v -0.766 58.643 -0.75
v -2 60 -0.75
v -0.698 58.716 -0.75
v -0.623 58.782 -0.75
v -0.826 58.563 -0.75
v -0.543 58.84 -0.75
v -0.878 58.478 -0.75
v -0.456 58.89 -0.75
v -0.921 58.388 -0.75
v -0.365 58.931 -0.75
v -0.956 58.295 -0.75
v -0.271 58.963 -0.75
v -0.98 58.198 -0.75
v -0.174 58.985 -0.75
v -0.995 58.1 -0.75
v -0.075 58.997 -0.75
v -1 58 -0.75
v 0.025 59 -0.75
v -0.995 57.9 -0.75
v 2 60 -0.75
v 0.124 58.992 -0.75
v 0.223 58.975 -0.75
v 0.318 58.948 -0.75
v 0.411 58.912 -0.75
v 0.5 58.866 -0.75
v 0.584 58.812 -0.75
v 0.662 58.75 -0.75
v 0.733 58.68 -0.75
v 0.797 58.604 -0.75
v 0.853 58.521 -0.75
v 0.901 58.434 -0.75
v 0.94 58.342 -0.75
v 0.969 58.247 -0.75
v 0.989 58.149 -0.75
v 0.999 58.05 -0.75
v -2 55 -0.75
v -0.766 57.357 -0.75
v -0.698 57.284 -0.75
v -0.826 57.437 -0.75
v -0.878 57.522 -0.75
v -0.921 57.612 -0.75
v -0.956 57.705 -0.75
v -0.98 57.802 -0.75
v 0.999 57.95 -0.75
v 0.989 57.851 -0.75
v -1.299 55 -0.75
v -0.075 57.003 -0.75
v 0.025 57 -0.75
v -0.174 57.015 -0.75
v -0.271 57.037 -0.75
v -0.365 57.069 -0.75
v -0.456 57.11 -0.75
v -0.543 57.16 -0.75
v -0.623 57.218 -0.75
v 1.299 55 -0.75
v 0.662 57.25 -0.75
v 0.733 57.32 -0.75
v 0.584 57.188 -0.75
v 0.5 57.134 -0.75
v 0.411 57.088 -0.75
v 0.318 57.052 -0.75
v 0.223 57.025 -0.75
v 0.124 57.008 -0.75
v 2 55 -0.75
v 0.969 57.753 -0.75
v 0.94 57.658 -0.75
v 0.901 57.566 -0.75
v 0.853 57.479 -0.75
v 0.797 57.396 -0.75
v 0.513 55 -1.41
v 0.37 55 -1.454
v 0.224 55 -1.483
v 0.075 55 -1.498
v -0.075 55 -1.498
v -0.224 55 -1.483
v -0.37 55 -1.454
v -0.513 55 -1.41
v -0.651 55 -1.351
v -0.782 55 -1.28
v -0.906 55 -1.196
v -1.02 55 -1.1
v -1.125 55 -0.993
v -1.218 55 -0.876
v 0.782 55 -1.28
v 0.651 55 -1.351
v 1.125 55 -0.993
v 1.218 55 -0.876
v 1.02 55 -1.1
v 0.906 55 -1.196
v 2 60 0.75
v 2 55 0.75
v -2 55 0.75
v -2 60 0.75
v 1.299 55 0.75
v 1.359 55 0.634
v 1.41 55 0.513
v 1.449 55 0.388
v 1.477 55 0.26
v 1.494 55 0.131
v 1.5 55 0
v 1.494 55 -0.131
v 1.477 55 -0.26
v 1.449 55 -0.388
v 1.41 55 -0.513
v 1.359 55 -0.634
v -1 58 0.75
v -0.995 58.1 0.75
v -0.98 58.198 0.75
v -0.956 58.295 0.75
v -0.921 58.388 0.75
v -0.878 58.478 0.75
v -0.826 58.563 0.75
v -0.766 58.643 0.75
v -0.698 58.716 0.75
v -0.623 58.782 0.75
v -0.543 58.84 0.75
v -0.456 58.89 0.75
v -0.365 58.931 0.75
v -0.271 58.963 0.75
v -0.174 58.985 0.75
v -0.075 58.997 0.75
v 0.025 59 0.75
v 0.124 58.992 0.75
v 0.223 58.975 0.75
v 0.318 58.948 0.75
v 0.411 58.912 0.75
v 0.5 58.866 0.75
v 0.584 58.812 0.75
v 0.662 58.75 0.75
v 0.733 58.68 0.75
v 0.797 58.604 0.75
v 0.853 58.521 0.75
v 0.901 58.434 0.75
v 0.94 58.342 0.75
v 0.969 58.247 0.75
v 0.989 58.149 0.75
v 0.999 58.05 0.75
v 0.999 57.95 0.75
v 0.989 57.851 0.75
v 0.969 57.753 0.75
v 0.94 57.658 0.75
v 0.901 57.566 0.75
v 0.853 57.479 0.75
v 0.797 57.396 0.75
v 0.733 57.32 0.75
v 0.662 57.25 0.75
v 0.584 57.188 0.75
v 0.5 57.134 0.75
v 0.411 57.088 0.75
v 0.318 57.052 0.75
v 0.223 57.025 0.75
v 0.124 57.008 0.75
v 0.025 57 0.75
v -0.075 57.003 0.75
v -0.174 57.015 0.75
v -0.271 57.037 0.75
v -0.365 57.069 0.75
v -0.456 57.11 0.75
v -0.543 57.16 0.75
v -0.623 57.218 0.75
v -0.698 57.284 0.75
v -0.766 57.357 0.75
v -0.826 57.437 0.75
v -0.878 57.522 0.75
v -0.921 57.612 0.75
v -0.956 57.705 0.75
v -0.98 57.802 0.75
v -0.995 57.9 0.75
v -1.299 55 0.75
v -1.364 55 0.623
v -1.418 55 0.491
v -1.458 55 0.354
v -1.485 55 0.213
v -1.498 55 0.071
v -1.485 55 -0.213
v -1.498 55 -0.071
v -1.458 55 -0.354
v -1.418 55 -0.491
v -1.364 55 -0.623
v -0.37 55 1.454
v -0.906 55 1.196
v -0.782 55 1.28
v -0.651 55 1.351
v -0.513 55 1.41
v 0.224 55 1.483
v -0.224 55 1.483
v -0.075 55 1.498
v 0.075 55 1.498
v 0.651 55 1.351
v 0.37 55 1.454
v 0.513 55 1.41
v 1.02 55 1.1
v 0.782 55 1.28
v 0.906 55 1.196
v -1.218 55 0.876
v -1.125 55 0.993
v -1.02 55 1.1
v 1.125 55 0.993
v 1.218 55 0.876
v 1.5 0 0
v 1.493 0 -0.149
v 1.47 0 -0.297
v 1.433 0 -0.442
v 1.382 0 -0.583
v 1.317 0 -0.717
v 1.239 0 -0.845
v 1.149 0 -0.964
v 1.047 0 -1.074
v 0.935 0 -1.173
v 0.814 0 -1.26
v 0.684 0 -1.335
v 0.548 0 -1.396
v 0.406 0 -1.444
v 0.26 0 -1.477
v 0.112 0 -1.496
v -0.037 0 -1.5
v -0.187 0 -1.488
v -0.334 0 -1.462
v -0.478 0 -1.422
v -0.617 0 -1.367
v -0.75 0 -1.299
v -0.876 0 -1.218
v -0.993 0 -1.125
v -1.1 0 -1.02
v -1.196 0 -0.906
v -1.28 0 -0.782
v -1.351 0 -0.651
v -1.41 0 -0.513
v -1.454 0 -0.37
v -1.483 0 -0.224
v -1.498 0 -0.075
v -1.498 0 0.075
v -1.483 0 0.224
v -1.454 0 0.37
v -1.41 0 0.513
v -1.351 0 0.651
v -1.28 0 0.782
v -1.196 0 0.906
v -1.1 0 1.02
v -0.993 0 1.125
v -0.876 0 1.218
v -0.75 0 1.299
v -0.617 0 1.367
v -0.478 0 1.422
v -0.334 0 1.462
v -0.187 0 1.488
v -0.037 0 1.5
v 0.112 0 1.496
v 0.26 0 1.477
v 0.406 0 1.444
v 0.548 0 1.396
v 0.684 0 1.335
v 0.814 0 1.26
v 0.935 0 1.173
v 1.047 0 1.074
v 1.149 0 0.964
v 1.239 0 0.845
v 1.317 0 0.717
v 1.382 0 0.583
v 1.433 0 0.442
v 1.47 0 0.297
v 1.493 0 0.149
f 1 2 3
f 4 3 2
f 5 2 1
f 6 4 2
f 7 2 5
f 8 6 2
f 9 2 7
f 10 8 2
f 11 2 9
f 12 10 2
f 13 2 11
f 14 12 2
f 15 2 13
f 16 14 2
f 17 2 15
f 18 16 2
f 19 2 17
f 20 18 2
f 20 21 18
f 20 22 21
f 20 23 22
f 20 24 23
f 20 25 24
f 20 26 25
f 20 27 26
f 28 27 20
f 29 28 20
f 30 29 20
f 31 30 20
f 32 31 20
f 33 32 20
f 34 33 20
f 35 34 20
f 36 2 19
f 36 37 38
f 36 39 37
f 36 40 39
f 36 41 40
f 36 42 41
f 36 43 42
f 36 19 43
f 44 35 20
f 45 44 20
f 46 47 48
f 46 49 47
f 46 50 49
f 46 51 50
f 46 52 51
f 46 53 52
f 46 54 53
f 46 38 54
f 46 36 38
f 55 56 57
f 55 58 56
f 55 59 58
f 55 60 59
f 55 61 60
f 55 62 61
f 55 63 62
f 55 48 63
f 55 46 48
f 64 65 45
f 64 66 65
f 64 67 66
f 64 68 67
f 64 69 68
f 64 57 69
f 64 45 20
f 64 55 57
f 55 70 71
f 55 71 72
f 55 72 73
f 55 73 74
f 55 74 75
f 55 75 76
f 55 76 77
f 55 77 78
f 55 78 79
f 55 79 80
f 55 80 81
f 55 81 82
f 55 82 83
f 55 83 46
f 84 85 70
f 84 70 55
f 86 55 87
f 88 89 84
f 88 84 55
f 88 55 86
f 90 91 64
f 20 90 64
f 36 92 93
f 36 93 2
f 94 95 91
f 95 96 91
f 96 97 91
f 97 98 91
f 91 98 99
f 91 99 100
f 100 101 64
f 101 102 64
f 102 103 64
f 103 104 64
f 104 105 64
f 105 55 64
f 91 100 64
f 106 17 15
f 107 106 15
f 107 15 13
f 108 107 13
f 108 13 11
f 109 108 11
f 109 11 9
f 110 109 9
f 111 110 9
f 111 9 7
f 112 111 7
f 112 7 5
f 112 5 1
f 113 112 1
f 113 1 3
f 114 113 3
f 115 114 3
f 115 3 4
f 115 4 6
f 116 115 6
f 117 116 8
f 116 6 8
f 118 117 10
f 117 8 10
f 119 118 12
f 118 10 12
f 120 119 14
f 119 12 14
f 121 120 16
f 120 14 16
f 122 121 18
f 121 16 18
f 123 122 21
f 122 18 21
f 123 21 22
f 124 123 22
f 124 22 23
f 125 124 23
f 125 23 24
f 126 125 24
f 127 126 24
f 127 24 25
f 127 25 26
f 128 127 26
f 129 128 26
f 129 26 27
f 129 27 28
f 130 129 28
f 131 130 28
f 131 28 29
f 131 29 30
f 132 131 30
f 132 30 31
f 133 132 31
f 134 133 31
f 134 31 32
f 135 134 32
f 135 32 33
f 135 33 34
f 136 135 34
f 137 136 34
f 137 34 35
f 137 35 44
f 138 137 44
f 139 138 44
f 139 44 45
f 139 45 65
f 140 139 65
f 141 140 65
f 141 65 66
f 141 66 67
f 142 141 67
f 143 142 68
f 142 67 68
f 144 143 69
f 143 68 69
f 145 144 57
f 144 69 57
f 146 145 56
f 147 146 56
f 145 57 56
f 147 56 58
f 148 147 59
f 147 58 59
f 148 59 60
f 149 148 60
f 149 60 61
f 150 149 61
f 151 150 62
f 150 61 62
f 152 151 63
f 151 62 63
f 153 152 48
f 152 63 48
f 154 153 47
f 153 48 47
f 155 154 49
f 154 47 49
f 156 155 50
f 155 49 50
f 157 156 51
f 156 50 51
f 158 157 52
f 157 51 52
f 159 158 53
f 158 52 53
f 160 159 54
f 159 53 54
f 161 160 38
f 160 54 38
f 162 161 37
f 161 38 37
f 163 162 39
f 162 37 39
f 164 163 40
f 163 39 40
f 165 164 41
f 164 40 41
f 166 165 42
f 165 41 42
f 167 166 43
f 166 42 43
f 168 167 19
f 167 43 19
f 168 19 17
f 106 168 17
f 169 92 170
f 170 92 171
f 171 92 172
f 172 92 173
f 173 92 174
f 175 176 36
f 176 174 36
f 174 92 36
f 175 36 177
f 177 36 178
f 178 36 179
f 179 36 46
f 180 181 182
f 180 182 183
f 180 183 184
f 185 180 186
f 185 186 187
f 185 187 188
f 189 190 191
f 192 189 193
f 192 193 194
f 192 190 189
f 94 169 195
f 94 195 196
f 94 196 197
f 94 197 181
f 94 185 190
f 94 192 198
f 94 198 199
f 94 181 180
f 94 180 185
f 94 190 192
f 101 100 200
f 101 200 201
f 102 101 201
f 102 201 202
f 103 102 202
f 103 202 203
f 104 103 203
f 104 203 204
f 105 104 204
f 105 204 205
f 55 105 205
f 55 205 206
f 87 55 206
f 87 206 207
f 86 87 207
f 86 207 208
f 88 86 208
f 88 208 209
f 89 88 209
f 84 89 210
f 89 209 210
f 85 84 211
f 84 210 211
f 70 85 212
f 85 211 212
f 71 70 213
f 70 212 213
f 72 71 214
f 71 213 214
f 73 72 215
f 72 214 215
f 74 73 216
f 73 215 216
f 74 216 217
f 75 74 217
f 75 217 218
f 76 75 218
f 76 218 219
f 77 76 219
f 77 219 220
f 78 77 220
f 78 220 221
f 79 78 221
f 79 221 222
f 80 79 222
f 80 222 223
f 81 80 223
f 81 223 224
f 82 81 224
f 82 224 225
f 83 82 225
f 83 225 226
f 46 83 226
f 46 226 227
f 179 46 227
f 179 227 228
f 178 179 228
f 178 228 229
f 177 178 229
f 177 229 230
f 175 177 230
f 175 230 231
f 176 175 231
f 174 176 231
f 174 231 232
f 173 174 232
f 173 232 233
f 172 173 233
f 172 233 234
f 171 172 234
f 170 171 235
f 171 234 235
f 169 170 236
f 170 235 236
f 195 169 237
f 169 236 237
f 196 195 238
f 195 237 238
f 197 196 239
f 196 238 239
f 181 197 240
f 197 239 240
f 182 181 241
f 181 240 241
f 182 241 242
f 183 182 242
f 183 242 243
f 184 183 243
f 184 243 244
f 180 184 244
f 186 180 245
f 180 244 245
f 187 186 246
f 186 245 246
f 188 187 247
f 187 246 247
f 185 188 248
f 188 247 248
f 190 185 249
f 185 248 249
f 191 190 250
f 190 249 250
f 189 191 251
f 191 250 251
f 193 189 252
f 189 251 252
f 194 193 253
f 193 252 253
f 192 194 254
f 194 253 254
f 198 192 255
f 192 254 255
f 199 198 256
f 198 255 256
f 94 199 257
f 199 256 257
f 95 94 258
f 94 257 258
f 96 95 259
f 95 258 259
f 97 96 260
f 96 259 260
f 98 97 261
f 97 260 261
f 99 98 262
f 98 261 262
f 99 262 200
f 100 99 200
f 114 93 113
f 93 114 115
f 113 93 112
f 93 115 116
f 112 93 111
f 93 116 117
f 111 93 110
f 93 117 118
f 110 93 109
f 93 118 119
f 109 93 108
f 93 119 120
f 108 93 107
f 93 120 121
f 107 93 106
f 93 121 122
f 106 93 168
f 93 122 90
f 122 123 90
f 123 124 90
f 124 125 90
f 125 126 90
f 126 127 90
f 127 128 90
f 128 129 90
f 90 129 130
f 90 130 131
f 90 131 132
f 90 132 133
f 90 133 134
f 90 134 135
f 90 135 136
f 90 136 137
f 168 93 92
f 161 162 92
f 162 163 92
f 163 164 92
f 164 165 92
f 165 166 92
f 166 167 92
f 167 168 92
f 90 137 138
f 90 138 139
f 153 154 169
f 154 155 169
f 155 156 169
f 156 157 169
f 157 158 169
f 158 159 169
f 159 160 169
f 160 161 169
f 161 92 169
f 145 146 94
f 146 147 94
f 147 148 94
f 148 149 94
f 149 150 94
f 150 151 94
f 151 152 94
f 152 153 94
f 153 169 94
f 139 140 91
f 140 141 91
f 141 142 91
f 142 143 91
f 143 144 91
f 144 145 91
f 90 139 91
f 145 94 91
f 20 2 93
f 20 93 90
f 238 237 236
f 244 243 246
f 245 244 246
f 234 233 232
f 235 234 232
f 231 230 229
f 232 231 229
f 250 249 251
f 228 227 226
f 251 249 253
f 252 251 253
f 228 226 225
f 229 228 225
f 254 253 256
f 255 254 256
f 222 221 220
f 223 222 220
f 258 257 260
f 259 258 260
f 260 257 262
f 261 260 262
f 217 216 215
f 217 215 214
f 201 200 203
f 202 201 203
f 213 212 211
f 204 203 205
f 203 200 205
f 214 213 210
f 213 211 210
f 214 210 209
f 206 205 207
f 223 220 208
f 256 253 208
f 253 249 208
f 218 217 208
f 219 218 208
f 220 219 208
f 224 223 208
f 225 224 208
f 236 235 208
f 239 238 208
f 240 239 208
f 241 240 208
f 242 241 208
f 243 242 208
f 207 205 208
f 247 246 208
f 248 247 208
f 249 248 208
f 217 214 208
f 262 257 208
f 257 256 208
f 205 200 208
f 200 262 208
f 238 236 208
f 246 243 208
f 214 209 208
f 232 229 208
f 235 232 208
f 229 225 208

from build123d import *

# Parameters (mm, degrees)
SKETCH1_R           = 1.5
BOSS_EXTRUDE1_DEPTH = 55
SKETCH2_W           = 4
SKETCH2_H           = 1.5
BOSS_EXTRUDE2_DEPTH = 5
SKETCH3_R           = 1
CUT_EXTRUDE1_DEPTH  = 3.25


with BuildPart() as part:
    # Sketch1 → Boss-Extrude1 (new body)
    with BuildSketch(Plane(origin=(0, 0, 0), x_dir=(1, 0, 0), z_dir=(0, 1, 0))):
        Circle(SKETCH1_R)
    extrude(amount=BOSS_EXTRUDE1_DEPTH)

    # Sketch2 → Boss-Extrude2 (add)
    with BuildSketch(Plane(origin=(0, 55, 0), x_dir=(1, 0, 0), z_dir=(0, 1, 0))):
        Rectangle(SKETCH2_W, SKETCH2_H)
    extrude(amount=BOSS_EXTRUDE2_DEPTH)

    # Sketch3 → Cut-Extrude1 (cut, through all)
    with BuildSketch(Plane(origin=(0, 0, -0.75), x_dir=(-1, 0, 0), z_dir=(0, 0, -1))):
        with Locations((0, 58)):
            Circle(SKETCH3_R)
    extrude(amount=-CUT_EXTRUDE1_DEPTH, mode=Mode.SUBTRACT)


solid = part.part
